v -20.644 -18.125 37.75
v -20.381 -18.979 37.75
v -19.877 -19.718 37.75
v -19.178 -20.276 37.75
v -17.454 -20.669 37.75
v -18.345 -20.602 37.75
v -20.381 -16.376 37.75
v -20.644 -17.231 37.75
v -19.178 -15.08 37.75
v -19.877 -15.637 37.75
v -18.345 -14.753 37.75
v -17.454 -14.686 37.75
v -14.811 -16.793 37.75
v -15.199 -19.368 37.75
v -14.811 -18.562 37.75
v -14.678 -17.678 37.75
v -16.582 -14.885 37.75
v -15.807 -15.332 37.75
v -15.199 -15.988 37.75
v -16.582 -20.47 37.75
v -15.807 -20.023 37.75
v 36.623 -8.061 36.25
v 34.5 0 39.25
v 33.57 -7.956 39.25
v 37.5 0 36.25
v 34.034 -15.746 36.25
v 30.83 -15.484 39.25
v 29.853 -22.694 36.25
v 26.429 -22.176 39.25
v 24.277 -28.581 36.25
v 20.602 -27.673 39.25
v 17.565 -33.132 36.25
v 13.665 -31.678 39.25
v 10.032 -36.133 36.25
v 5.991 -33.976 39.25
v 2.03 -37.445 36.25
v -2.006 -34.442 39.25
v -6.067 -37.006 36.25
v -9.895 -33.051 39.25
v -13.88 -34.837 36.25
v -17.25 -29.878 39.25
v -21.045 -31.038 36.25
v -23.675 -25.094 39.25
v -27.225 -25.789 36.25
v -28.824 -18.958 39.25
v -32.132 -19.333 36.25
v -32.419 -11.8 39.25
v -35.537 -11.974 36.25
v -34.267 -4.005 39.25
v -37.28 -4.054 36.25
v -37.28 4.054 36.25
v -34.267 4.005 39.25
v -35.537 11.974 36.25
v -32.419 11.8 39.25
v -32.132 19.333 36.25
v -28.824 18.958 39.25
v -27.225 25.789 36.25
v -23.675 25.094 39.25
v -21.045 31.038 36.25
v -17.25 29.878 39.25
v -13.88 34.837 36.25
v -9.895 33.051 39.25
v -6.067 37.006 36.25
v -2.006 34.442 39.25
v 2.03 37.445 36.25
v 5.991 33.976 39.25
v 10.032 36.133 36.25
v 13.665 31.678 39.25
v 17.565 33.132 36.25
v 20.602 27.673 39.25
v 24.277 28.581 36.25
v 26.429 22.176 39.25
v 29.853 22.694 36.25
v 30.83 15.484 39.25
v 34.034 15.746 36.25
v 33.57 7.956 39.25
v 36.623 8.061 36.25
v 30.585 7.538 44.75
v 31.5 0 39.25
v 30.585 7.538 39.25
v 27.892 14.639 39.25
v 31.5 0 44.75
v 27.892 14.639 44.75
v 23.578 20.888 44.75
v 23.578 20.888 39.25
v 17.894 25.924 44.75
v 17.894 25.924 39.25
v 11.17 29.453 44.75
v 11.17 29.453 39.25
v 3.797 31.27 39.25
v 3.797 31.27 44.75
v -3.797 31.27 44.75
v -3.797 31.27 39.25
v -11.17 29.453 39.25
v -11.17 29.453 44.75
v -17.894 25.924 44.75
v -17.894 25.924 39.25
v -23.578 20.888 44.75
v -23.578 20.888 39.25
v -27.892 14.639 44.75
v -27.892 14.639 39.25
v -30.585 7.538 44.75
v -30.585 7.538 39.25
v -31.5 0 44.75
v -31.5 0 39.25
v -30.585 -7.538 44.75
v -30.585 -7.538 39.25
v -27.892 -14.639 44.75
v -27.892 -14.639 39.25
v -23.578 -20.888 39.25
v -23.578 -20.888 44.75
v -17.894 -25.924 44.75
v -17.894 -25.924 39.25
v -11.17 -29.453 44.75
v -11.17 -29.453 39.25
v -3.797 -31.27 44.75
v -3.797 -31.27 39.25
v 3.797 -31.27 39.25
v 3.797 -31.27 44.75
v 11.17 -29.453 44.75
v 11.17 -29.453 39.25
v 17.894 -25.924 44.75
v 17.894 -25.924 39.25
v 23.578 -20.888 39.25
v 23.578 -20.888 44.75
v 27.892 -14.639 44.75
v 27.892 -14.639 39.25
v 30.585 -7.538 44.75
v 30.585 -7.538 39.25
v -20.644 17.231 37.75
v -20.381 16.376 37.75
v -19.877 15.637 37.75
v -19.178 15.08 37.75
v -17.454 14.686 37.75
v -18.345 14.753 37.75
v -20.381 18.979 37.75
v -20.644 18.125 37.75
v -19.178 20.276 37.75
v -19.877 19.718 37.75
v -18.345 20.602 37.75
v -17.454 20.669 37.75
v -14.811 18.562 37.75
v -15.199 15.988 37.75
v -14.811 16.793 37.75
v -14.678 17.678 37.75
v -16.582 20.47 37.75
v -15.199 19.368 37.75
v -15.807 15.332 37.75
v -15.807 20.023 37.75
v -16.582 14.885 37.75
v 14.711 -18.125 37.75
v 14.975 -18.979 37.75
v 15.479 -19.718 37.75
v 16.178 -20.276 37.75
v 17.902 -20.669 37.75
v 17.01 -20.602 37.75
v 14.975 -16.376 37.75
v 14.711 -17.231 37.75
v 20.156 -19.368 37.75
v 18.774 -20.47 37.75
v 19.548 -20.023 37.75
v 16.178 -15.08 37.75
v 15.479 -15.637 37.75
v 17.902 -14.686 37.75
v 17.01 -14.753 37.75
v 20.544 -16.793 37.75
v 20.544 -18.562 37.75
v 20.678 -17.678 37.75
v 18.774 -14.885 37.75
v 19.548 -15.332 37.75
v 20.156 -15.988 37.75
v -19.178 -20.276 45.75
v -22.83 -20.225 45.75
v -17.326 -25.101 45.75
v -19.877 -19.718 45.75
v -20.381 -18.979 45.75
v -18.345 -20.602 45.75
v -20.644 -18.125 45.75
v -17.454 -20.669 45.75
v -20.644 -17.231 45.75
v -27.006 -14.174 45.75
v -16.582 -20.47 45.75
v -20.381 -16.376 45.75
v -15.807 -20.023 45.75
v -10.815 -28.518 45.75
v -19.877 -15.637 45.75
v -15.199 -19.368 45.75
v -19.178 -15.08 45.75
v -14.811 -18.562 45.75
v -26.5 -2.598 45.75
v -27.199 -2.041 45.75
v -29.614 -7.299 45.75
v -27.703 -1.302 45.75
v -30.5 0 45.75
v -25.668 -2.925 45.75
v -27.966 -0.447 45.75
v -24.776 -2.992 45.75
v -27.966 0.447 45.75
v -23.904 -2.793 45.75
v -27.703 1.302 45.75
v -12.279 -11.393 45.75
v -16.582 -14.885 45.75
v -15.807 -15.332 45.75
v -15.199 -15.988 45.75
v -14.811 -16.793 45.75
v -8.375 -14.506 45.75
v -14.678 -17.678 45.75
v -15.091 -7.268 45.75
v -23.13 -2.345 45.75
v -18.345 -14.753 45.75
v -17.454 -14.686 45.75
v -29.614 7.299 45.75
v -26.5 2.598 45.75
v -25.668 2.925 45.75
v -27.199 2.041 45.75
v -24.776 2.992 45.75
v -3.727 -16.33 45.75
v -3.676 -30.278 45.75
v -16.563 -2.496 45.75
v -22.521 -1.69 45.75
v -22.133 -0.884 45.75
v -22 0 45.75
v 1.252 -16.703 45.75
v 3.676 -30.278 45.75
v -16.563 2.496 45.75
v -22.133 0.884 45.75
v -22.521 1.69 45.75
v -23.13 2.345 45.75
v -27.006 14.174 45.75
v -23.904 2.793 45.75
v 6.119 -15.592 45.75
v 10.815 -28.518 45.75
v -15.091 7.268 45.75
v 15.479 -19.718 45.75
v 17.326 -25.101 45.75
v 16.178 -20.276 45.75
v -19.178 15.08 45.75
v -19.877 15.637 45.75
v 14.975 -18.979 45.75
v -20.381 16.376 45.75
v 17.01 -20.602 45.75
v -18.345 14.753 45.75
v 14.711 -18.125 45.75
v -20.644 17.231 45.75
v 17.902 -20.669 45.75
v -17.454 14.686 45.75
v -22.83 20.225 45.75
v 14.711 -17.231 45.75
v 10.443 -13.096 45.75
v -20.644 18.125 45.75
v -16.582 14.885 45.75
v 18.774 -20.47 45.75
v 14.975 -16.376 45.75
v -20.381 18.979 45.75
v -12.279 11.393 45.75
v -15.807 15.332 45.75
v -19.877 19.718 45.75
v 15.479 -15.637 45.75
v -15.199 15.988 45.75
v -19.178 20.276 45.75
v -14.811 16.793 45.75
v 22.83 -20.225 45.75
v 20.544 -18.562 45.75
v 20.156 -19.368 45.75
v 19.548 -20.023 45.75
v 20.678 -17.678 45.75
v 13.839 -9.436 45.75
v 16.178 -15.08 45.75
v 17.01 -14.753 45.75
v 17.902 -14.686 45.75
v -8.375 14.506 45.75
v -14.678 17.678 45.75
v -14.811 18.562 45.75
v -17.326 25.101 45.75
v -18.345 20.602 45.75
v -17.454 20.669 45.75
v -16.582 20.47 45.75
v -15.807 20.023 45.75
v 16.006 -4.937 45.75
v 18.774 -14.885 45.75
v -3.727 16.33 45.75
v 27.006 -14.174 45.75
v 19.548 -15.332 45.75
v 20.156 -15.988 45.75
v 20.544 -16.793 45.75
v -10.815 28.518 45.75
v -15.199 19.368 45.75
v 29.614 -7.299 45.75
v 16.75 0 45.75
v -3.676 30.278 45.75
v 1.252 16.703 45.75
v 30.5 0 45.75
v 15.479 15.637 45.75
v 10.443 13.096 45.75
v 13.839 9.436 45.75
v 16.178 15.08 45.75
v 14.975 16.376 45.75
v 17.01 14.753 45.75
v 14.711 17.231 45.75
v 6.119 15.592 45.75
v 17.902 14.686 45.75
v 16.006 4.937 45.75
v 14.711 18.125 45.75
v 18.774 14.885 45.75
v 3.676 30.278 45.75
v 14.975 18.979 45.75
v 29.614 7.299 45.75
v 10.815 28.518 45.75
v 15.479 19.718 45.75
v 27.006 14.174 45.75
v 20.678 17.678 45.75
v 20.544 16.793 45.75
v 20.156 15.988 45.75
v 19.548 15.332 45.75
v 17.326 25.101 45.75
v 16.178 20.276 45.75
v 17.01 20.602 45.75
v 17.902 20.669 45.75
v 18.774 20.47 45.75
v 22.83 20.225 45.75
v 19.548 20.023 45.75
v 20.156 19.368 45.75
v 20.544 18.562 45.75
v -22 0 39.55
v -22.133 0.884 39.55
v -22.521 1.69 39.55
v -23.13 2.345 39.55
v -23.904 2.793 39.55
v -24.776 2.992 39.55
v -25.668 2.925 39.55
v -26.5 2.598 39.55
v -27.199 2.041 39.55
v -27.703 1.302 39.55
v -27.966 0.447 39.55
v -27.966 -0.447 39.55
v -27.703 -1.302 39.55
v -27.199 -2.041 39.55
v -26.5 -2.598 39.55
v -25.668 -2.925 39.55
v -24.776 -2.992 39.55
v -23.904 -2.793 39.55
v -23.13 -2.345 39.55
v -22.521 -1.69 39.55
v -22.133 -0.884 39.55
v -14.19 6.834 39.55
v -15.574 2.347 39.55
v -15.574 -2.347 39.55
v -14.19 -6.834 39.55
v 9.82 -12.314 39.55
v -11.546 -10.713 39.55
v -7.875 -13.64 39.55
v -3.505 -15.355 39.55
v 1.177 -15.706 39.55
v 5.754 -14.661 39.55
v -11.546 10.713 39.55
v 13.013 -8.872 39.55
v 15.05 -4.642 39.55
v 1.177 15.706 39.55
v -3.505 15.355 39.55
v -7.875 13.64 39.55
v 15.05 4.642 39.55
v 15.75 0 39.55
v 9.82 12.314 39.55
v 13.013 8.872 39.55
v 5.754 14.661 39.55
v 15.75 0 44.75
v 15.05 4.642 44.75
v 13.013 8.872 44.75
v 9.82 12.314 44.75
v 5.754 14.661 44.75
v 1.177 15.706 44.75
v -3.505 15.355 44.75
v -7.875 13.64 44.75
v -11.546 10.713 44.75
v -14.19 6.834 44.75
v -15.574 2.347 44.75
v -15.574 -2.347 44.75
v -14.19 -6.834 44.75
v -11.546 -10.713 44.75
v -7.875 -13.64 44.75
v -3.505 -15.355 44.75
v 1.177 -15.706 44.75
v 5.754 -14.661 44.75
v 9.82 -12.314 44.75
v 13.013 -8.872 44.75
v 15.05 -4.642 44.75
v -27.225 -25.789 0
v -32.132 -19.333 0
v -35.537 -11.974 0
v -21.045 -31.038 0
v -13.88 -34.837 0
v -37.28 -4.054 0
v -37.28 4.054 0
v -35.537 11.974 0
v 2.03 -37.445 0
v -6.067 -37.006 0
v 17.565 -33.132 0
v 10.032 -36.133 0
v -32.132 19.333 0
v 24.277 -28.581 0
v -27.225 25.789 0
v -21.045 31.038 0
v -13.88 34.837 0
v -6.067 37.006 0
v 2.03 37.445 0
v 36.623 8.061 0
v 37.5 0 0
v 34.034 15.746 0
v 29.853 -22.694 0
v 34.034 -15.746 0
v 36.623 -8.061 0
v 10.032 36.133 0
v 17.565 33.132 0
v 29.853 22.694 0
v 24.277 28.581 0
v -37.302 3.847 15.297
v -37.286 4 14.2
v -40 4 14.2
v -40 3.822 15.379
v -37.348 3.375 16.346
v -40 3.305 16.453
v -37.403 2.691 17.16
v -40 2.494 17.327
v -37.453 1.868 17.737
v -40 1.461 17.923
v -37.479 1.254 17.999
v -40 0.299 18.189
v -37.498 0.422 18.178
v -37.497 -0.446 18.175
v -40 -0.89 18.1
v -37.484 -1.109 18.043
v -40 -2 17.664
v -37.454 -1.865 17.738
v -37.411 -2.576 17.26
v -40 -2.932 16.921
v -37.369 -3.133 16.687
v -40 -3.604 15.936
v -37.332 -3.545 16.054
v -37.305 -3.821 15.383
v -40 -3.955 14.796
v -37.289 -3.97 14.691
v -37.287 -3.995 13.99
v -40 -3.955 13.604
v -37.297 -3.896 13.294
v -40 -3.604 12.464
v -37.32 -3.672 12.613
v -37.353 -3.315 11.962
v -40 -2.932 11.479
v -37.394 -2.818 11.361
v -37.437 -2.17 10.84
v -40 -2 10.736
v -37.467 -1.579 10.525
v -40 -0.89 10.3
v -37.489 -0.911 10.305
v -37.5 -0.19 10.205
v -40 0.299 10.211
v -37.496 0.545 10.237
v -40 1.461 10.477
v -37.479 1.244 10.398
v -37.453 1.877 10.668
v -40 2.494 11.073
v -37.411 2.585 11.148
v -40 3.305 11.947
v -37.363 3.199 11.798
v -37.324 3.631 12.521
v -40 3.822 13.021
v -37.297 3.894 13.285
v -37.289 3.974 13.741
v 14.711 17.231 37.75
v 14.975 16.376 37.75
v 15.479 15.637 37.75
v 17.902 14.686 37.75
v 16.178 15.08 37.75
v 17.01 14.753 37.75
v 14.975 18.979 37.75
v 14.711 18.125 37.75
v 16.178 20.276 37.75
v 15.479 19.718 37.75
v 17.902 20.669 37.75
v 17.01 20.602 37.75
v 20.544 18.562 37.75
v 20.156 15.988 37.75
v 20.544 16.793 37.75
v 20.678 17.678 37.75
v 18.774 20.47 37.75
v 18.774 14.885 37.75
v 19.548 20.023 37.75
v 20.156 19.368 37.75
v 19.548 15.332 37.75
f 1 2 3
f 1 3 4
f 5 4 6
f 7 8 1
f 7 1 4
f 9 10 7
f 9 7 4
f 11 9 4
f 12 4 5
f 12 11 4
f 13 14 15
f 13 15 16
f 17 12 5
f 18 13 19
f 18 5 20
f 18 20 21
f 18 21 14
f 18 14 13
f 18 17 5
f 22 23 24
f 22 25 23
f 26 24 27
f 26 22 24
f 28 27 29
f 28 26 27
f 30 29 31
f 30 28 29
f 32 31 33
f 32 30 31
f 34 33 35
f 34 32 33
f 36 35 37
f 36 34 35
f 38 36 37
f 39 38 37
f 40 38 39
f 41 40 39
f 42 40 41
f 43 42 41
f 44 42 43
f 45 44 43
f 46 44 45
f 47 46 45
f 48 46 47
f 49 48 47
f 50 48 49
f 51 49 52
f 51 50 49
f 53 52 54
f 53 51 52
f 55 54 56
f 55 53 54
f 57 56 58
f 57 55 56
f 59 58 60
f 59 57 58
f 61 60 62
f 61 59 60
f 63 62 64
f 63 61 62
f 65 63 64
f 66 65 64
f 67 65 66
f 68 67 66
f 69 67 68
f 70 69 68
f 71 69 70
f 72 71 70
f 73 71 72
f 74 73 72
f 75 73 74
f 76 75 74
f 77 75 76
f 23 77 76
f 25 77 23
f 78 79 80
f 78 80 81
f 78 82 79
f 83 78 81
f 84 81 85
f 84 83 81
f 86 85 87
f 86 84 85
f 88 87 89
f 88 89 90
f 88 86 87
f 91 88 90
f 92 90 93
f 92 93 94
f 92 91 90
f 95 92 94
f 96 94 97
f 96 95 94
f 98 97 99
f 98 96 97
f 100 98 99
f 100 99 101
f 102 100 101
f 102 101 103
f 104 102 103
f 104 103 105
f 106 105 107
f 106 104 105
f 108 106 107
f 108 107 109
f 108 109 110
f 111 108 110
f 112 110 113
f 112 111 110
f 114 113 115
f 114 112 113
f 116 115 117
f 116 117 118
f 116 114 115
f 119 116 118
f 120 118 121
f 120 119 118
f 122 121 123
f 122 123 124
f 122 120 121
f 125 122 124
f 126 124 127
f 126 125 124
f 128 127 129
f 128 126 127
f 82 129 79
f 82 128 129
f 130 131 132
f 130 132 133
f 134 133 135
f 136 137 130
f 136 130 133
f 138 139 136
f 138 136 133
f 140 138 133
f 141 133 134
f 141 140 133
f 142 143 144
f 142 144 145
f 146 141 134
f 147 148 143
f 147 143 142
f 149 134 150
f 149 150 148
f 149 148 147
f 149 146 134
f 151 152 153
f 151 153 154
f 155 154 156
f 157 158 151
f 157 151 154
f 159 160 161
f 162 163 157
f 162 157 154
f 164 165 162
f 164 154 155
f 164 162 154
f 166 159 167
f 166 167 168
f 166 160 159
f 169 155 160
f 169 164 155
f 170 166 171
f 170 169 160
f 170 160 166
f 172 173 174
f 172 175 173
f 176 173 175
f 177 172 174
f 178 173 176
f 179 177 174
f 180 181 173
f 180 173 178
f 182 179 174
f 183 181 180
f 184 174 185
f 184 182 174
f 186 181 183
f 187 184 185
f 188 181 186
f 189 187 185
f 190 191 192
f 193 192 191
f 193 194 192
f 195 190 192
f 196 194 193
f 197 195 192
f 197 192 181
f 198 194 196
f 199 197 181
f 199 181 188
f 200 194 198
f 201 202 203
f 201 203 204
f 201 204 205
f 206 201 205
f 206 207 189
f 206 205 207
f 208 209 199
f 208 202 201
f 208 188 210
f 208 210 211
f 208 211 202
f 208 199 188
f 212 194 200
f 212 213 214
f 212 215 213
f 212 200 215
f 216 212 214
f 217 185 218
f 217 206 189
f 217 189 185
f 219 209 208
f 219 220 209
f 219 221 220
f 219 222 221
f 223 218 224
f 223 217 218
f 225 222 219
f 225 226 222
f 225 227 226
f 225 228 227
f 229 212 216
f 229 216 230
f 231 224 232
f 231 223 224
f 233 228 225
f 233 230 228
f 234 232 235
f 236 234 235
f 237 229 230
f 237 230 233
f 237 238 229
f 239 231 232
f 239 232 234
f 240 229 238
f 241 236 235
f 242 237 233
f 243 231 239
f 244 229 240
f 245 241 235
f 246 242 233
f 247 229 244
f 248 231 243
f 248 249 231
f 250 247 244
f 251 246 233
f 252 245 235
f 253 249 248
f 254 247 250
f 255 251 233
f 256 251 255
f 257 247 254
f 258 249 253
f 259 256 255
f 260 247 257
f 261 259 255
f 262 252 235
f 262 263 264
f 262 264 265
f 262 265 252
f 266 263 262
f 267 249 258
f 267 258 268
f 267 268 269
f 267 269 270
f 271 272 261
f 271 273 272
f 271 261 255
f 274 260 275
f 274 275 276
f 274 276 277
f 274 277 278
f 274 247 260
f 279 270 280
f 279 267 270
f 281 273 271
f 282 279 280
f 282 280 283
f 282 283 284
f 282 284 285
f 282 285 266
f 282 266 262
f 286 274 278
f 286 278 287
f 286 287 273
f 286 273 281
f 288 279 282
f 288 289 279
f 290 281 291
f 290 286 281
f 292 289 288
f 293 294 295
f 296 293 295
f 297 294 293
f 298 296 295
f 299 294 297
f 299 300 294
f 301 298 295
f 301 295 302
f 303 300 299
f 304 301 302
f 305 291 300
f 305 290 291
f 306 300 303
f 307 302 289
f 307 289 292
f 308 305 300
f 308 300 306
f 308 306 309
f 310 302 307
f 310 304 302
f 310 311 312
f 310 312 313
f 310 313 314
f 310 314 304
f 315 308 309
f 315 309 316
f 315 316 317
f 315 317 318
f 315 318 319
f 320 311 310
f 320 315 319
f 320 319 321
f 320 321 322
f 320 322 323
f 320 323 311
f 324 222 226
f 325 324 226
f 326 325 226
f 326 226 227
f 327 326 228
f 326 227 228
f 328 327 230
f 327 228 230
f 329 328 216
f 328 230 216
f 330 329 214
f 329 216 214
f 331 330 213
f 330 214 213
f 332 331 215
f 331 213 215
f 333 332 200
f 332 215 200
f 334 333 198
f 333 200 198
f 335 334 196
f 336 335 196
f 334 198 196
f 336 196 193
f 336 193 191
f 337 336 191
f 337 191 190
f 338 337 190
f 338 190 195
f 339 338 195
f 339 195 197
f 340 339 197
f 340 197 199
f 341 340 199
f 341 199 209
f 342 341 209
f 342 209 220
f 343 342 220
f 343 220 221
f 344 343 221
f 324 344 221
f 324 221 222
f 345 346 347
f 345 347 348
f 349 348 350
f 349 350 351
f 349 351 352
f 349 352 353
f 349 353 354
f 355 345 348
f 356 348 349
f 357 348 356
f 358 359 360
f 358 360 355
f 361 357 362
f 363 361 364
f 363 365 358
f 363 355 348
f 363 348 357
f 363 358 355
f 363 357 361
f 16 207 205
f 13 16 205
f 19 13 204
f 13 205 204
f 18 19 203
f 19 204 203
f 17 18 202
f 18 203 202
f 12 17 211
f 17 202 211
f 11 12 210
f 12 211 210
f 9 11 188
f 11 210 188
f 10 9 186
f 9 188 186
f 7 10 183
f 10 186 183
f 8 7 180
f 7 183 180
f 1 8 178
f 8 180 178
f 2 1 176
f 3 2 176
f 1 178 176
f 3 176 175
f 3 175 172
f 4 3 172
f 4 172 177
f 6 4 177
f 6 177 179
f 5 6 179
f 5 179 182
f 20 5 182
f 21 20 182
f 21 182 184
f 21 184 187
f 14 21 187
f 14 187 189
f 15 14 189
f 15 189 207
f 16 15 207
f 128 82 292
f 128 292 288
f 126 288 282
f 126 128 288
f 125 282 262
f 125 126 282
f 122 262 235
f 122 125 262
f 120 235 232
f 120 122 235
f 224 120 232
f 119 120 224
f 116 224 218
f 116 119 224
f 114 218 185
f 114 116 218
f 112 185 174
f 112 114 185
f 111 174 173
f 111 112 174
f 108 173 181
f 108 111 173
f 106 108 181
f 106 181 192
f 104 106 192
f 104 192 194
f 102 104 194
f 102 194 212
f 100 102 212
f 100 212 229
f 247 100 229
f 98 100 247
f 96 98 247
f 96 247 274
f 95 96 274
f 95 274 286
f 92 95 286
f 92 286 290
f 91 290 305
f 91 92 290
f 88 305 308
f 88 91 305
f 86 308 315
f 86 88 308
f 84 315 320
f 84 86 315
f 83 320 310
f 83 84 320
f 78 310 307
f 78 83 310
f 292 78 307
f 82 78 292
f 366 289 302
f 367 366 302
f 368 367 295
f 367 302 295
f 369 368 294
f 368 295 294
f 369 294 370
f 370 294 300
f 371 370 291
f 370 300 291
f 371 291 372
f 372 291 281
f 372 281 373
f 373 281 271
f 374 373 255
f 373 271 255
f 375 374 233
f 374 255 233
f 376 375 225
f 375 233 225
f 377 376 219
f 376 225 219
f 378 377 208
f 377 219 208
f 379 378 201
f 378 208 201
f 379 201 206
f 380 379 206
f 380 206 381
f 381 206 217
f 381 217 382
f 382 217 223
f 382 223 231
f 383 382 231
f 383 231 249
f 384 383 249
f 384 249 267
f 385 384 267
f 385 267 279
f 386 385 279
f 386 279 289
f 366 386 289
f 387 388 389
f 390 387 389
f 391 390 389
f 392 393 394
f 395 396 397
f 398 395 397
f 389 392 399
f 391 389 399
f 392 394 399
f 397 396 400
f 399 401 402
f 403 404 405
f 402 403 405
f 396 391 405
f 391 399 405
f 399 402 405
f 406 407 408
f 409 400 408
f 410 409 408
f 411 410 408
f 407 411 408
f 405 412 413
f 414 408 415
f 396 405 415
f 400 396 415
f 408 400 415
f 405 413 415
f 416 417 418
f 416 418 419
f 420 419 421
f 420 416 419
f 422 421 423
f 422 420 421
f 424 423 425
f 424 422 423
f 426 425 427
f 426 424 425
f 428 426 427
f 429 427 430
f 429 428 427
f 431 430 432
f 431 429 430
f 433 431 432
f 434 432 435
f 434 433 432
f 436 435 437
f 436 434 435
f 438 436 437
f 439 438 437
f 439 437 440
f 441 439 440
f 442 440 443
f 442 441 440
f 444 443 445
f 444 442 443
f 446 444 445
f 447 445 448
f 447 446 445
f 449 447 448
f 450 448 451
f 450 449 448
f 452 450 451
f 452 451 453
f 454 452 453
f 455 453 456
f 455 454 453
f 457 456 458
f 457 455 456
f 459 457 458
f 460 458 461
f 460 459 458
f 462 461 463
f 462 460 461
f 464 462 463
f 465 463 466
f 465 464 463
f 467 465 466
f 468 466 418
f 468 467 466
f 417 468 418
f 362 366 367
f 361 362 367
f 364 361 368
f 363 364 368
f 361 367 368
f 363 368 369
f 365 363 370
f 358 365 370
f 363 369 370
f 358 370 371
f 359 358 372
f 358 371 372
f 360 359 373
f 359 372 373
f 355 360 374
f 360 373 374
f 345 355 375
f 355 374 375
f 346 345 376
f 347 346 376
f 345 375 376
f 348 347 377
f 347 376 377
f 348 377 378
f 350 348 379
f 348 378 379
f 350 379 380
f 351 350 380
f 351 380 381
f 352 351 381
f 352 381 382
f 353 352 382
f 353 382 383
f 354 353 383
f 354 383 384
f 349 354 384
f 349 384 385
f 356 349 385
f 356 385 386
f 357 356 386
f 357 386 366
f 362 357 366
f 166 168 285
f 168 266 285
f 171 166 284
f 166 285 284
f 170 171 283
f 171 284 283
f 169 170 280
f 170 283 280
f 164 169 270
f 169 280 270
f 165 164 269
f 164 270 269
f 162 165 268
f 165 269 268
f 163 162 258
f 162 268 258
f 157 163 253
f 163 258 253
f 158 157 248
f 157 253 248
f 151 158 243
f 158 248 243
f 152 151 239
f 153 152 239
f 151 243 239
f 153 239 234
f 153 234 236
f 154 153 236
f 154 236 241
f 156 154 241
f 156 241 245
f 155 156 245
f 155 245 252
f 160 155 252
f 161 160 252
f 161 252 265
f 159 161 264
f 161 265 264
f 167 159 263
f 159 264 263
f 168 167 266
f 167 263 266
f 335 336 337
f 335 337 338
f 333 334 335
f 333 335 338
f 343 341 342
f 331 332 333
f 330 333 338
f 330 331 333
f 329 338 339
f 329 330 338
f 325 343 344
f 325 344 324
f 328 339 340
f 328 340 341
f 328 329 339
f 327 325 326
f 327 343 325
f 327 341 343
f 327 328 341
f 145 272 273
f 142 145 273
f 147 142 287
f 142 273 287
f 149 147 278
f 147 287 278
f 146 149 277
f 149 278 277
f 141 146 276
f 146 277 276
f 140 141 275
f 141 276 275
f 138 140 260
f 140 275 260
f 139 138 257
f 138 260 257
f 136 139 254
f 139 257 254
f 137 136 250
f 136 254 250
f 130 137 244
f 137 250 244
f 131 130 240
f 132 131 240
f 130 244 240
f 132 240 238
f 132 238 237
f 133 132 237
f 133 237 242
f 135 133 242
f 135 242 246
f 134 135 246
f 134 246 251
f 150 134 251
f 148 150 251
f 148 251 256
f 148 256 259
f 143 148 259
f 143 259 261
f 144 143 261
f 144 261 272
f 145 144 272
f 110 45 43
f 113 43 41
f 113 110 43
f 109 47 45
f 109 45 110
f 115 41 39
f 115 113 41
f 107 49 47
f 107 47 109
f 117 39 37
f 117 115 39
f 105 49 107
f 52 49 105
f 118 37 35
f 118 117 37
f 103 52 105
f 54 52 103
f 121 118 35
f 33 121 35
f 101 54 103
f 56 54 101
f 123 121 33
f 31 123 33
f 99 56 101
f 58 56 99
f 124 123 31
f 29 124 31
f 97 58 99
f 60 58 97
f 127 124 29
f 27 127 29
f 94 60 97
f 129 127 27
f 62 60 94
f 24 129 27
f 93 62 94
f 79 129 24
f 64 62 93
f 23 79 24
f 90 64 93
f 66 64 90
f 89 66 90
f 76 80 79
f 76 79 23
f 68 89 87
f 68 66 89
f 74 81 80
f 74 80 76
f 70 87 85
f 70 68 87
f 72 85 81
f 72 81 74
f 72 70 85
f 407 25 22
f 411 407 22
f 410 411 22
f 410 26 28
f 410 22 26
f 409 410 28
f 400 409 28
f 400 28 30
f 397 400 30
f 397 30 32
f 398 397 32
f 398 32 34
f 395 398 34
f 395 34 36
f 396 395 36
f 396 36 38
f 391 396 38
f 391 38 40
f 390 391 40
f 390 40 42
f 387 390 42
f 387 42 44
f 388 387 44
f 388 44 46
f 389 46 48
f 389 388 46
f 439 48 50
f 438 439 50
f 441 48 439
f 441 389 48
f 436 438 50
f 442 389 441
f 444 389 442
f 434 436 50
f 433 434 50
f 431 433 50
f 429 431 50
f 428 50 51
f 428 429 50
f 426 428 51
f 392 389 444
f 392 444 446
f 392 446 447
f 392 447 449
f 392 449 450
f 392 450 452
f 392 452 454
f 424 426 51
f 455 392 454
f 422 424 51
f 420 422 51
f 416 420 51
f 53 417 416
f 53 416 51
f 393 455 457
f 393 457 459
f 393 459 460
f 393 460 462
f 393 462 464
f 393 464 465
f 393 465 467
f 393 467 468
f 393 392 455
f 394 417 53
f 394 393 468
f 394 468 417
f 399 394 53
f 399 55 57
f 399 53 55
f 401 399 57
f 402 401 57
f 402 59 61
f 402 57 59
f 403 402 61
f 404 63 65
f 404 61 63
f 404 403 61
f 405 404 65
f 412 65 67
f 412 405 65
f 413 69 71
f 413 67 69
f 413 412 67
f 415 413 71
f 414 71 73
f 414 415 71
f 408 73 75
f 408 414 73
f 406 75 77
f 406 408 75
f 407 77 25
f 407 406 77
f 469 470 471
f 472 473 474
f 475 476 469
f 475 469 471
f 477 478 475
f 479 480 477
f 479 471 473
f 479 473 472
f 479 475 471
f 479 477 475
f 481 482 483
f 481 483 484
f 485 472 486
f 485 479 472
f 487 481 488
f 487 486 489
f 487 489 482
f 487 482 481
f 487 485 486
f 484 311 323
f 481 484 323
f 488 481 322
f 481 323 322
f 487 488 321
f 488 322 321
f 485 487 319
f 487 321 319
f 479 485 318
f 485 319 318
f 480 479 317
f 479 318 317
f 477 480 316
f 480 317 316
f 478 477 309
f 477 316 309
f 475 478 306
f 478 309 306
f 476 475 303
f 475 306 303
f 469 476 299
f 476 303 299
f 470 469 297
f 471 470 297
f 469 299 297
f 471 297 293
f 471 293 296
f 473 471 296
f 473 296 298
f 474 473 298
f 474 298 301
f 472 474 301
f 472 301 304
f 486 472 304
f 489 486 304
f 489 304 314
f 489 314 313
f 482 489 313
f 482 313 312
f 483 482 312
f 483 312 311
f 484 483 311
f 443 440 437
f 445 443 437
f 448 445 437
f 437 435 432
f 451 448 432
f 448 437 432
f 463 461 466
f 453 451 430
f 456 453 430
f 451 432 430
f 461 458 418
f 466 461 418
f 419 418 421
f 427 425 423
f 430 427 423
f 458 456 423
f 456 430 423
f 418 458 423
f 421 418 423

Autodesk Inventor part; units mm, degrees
ref_plane "YZ Plane" through (0, 0, 0) normal (1, 0, 0) x (0, 1, 0)
ref_plane "XZ Plane" through (0, 0, 0) normal (0, 1, 0) x (-1, 0, 0)
ref_plane "XY Plane" through (0, 0, 0) normal (0, 0, 1) x (1, 0, 0)
sketch "スケッチ1" plane through (0, 0, 0) normal (0, 0, 1) x (1, 0, 0)
  circle A0 centre (0, 0) radius 37.5
  dimension "d0" = 75
extrude "押し出し1" add sketch "スケッチ1" along normal blind 45.75
sketch "スケッチ2" plane through (0, 0, 45.75) normal (0, 0, 1) x (1, 0, 0)
  circle A0 centre (0, 0) radius 37.5
  circle A1 centre (0, 0) radius 31.5
  dimension "d3" = 63
extrude "押し出し2" cut sketch "スケッチ2" against normal blind 6.5
chamfer "面取り1" distance 3 angle 45 1 edges at (-37.5, 0, 39.25)
chamfer "面取り2" distance 1 angle 45 1 edges at (-31.5, 0, 45.75)
sketch "スケッチ3" plane through (0, 0, 45.75) normal (0, 0, 1) x (1, 0, 0)
  circle A0 centre (0, 0) radius 15.75
  dimension "d12" = 31.5
extrude "押し出し3" cut sketch "スケッチ3" against normal blind 6.2
chamfer "面取り3" distance 1 angle 45 1 edges at (-15.75, 0, 45.75)
sketch "スケッチ4" plane through (0, 0, 45.75) normal (0, 0, 1) x (1, 0, 0)
  circle A0 centre (-25, 0) radius 3
  point P0 (0, 0)
  dimension "d18" = 6
extrude "押し出し4" cut sketch "スケッチ4" against normal blind 6.2
sketch "スケッチ5" plane through (0, 0, 45.75) normal (0, 0, 1) x (1, 0, 0)
  point P0 (0, 0)
sketch "スケッチ6" plane through (0, 0, 45.75) normal (0, 0, 1) x (1, 0, 0)
  circle A0 centre (0, 0) radius 25
  circle A1 centre (0, 0) radius 37.5 projected
  line L0 (0, 0) -> (-17.6777, 17.6777)
  line L1 (0, 0) -> (25, 0) construction
  circle A2 centre (-17.6777, 17.6777) radius 3
  circle A3 centre (17.6777, 17.6777) radius 3
  circle A4 centre (17.6777, -17.6777) radius 3
  circle A5 centre (-17.6777, -17.6777) radius 3
  dimension "d21" = 50
  dimension "d22" = 135
  dimension "d23" = 6
  dimension "d24" = 6
  dimension "d25" = 6
  dimension "d26" = 6
extrude "押し出し5" cut sketch "スケッチ6" against normal blind 8 contours A3 A0 | A0 A3 | A4 A0 | A0 A4 | A2 L0 A0 | A0 A2 | A5 A0 | A0 A5 | L0 A2 A0
thread "ねじ1" size "M6x1" class "6H" standard "ANSI Metric M Profile" full length
thread "ねじ2" size "M6x1" class "6H" standard "ANSI Metric M Profile" full length
thread "ねじ3" size "M6x1" class "6H" standard "ANSI Metric M Profile" full length
thread "ねじ4" size "M6x1" class "6H" standard "ANSI Metric M Profile" full length
sketch "スケッチ7" plane through (0, 0, 0) normal (1, 0, 0) x (0, 1, 0)
  circle A0 centre (0, 14.2) radius 4
  point P0 (0, 0)
  dimension "d37" = 8
extrude "押し出し6" add sketch "スケッチ7" against normal blind 40
properties part number "tool-output-flange"
